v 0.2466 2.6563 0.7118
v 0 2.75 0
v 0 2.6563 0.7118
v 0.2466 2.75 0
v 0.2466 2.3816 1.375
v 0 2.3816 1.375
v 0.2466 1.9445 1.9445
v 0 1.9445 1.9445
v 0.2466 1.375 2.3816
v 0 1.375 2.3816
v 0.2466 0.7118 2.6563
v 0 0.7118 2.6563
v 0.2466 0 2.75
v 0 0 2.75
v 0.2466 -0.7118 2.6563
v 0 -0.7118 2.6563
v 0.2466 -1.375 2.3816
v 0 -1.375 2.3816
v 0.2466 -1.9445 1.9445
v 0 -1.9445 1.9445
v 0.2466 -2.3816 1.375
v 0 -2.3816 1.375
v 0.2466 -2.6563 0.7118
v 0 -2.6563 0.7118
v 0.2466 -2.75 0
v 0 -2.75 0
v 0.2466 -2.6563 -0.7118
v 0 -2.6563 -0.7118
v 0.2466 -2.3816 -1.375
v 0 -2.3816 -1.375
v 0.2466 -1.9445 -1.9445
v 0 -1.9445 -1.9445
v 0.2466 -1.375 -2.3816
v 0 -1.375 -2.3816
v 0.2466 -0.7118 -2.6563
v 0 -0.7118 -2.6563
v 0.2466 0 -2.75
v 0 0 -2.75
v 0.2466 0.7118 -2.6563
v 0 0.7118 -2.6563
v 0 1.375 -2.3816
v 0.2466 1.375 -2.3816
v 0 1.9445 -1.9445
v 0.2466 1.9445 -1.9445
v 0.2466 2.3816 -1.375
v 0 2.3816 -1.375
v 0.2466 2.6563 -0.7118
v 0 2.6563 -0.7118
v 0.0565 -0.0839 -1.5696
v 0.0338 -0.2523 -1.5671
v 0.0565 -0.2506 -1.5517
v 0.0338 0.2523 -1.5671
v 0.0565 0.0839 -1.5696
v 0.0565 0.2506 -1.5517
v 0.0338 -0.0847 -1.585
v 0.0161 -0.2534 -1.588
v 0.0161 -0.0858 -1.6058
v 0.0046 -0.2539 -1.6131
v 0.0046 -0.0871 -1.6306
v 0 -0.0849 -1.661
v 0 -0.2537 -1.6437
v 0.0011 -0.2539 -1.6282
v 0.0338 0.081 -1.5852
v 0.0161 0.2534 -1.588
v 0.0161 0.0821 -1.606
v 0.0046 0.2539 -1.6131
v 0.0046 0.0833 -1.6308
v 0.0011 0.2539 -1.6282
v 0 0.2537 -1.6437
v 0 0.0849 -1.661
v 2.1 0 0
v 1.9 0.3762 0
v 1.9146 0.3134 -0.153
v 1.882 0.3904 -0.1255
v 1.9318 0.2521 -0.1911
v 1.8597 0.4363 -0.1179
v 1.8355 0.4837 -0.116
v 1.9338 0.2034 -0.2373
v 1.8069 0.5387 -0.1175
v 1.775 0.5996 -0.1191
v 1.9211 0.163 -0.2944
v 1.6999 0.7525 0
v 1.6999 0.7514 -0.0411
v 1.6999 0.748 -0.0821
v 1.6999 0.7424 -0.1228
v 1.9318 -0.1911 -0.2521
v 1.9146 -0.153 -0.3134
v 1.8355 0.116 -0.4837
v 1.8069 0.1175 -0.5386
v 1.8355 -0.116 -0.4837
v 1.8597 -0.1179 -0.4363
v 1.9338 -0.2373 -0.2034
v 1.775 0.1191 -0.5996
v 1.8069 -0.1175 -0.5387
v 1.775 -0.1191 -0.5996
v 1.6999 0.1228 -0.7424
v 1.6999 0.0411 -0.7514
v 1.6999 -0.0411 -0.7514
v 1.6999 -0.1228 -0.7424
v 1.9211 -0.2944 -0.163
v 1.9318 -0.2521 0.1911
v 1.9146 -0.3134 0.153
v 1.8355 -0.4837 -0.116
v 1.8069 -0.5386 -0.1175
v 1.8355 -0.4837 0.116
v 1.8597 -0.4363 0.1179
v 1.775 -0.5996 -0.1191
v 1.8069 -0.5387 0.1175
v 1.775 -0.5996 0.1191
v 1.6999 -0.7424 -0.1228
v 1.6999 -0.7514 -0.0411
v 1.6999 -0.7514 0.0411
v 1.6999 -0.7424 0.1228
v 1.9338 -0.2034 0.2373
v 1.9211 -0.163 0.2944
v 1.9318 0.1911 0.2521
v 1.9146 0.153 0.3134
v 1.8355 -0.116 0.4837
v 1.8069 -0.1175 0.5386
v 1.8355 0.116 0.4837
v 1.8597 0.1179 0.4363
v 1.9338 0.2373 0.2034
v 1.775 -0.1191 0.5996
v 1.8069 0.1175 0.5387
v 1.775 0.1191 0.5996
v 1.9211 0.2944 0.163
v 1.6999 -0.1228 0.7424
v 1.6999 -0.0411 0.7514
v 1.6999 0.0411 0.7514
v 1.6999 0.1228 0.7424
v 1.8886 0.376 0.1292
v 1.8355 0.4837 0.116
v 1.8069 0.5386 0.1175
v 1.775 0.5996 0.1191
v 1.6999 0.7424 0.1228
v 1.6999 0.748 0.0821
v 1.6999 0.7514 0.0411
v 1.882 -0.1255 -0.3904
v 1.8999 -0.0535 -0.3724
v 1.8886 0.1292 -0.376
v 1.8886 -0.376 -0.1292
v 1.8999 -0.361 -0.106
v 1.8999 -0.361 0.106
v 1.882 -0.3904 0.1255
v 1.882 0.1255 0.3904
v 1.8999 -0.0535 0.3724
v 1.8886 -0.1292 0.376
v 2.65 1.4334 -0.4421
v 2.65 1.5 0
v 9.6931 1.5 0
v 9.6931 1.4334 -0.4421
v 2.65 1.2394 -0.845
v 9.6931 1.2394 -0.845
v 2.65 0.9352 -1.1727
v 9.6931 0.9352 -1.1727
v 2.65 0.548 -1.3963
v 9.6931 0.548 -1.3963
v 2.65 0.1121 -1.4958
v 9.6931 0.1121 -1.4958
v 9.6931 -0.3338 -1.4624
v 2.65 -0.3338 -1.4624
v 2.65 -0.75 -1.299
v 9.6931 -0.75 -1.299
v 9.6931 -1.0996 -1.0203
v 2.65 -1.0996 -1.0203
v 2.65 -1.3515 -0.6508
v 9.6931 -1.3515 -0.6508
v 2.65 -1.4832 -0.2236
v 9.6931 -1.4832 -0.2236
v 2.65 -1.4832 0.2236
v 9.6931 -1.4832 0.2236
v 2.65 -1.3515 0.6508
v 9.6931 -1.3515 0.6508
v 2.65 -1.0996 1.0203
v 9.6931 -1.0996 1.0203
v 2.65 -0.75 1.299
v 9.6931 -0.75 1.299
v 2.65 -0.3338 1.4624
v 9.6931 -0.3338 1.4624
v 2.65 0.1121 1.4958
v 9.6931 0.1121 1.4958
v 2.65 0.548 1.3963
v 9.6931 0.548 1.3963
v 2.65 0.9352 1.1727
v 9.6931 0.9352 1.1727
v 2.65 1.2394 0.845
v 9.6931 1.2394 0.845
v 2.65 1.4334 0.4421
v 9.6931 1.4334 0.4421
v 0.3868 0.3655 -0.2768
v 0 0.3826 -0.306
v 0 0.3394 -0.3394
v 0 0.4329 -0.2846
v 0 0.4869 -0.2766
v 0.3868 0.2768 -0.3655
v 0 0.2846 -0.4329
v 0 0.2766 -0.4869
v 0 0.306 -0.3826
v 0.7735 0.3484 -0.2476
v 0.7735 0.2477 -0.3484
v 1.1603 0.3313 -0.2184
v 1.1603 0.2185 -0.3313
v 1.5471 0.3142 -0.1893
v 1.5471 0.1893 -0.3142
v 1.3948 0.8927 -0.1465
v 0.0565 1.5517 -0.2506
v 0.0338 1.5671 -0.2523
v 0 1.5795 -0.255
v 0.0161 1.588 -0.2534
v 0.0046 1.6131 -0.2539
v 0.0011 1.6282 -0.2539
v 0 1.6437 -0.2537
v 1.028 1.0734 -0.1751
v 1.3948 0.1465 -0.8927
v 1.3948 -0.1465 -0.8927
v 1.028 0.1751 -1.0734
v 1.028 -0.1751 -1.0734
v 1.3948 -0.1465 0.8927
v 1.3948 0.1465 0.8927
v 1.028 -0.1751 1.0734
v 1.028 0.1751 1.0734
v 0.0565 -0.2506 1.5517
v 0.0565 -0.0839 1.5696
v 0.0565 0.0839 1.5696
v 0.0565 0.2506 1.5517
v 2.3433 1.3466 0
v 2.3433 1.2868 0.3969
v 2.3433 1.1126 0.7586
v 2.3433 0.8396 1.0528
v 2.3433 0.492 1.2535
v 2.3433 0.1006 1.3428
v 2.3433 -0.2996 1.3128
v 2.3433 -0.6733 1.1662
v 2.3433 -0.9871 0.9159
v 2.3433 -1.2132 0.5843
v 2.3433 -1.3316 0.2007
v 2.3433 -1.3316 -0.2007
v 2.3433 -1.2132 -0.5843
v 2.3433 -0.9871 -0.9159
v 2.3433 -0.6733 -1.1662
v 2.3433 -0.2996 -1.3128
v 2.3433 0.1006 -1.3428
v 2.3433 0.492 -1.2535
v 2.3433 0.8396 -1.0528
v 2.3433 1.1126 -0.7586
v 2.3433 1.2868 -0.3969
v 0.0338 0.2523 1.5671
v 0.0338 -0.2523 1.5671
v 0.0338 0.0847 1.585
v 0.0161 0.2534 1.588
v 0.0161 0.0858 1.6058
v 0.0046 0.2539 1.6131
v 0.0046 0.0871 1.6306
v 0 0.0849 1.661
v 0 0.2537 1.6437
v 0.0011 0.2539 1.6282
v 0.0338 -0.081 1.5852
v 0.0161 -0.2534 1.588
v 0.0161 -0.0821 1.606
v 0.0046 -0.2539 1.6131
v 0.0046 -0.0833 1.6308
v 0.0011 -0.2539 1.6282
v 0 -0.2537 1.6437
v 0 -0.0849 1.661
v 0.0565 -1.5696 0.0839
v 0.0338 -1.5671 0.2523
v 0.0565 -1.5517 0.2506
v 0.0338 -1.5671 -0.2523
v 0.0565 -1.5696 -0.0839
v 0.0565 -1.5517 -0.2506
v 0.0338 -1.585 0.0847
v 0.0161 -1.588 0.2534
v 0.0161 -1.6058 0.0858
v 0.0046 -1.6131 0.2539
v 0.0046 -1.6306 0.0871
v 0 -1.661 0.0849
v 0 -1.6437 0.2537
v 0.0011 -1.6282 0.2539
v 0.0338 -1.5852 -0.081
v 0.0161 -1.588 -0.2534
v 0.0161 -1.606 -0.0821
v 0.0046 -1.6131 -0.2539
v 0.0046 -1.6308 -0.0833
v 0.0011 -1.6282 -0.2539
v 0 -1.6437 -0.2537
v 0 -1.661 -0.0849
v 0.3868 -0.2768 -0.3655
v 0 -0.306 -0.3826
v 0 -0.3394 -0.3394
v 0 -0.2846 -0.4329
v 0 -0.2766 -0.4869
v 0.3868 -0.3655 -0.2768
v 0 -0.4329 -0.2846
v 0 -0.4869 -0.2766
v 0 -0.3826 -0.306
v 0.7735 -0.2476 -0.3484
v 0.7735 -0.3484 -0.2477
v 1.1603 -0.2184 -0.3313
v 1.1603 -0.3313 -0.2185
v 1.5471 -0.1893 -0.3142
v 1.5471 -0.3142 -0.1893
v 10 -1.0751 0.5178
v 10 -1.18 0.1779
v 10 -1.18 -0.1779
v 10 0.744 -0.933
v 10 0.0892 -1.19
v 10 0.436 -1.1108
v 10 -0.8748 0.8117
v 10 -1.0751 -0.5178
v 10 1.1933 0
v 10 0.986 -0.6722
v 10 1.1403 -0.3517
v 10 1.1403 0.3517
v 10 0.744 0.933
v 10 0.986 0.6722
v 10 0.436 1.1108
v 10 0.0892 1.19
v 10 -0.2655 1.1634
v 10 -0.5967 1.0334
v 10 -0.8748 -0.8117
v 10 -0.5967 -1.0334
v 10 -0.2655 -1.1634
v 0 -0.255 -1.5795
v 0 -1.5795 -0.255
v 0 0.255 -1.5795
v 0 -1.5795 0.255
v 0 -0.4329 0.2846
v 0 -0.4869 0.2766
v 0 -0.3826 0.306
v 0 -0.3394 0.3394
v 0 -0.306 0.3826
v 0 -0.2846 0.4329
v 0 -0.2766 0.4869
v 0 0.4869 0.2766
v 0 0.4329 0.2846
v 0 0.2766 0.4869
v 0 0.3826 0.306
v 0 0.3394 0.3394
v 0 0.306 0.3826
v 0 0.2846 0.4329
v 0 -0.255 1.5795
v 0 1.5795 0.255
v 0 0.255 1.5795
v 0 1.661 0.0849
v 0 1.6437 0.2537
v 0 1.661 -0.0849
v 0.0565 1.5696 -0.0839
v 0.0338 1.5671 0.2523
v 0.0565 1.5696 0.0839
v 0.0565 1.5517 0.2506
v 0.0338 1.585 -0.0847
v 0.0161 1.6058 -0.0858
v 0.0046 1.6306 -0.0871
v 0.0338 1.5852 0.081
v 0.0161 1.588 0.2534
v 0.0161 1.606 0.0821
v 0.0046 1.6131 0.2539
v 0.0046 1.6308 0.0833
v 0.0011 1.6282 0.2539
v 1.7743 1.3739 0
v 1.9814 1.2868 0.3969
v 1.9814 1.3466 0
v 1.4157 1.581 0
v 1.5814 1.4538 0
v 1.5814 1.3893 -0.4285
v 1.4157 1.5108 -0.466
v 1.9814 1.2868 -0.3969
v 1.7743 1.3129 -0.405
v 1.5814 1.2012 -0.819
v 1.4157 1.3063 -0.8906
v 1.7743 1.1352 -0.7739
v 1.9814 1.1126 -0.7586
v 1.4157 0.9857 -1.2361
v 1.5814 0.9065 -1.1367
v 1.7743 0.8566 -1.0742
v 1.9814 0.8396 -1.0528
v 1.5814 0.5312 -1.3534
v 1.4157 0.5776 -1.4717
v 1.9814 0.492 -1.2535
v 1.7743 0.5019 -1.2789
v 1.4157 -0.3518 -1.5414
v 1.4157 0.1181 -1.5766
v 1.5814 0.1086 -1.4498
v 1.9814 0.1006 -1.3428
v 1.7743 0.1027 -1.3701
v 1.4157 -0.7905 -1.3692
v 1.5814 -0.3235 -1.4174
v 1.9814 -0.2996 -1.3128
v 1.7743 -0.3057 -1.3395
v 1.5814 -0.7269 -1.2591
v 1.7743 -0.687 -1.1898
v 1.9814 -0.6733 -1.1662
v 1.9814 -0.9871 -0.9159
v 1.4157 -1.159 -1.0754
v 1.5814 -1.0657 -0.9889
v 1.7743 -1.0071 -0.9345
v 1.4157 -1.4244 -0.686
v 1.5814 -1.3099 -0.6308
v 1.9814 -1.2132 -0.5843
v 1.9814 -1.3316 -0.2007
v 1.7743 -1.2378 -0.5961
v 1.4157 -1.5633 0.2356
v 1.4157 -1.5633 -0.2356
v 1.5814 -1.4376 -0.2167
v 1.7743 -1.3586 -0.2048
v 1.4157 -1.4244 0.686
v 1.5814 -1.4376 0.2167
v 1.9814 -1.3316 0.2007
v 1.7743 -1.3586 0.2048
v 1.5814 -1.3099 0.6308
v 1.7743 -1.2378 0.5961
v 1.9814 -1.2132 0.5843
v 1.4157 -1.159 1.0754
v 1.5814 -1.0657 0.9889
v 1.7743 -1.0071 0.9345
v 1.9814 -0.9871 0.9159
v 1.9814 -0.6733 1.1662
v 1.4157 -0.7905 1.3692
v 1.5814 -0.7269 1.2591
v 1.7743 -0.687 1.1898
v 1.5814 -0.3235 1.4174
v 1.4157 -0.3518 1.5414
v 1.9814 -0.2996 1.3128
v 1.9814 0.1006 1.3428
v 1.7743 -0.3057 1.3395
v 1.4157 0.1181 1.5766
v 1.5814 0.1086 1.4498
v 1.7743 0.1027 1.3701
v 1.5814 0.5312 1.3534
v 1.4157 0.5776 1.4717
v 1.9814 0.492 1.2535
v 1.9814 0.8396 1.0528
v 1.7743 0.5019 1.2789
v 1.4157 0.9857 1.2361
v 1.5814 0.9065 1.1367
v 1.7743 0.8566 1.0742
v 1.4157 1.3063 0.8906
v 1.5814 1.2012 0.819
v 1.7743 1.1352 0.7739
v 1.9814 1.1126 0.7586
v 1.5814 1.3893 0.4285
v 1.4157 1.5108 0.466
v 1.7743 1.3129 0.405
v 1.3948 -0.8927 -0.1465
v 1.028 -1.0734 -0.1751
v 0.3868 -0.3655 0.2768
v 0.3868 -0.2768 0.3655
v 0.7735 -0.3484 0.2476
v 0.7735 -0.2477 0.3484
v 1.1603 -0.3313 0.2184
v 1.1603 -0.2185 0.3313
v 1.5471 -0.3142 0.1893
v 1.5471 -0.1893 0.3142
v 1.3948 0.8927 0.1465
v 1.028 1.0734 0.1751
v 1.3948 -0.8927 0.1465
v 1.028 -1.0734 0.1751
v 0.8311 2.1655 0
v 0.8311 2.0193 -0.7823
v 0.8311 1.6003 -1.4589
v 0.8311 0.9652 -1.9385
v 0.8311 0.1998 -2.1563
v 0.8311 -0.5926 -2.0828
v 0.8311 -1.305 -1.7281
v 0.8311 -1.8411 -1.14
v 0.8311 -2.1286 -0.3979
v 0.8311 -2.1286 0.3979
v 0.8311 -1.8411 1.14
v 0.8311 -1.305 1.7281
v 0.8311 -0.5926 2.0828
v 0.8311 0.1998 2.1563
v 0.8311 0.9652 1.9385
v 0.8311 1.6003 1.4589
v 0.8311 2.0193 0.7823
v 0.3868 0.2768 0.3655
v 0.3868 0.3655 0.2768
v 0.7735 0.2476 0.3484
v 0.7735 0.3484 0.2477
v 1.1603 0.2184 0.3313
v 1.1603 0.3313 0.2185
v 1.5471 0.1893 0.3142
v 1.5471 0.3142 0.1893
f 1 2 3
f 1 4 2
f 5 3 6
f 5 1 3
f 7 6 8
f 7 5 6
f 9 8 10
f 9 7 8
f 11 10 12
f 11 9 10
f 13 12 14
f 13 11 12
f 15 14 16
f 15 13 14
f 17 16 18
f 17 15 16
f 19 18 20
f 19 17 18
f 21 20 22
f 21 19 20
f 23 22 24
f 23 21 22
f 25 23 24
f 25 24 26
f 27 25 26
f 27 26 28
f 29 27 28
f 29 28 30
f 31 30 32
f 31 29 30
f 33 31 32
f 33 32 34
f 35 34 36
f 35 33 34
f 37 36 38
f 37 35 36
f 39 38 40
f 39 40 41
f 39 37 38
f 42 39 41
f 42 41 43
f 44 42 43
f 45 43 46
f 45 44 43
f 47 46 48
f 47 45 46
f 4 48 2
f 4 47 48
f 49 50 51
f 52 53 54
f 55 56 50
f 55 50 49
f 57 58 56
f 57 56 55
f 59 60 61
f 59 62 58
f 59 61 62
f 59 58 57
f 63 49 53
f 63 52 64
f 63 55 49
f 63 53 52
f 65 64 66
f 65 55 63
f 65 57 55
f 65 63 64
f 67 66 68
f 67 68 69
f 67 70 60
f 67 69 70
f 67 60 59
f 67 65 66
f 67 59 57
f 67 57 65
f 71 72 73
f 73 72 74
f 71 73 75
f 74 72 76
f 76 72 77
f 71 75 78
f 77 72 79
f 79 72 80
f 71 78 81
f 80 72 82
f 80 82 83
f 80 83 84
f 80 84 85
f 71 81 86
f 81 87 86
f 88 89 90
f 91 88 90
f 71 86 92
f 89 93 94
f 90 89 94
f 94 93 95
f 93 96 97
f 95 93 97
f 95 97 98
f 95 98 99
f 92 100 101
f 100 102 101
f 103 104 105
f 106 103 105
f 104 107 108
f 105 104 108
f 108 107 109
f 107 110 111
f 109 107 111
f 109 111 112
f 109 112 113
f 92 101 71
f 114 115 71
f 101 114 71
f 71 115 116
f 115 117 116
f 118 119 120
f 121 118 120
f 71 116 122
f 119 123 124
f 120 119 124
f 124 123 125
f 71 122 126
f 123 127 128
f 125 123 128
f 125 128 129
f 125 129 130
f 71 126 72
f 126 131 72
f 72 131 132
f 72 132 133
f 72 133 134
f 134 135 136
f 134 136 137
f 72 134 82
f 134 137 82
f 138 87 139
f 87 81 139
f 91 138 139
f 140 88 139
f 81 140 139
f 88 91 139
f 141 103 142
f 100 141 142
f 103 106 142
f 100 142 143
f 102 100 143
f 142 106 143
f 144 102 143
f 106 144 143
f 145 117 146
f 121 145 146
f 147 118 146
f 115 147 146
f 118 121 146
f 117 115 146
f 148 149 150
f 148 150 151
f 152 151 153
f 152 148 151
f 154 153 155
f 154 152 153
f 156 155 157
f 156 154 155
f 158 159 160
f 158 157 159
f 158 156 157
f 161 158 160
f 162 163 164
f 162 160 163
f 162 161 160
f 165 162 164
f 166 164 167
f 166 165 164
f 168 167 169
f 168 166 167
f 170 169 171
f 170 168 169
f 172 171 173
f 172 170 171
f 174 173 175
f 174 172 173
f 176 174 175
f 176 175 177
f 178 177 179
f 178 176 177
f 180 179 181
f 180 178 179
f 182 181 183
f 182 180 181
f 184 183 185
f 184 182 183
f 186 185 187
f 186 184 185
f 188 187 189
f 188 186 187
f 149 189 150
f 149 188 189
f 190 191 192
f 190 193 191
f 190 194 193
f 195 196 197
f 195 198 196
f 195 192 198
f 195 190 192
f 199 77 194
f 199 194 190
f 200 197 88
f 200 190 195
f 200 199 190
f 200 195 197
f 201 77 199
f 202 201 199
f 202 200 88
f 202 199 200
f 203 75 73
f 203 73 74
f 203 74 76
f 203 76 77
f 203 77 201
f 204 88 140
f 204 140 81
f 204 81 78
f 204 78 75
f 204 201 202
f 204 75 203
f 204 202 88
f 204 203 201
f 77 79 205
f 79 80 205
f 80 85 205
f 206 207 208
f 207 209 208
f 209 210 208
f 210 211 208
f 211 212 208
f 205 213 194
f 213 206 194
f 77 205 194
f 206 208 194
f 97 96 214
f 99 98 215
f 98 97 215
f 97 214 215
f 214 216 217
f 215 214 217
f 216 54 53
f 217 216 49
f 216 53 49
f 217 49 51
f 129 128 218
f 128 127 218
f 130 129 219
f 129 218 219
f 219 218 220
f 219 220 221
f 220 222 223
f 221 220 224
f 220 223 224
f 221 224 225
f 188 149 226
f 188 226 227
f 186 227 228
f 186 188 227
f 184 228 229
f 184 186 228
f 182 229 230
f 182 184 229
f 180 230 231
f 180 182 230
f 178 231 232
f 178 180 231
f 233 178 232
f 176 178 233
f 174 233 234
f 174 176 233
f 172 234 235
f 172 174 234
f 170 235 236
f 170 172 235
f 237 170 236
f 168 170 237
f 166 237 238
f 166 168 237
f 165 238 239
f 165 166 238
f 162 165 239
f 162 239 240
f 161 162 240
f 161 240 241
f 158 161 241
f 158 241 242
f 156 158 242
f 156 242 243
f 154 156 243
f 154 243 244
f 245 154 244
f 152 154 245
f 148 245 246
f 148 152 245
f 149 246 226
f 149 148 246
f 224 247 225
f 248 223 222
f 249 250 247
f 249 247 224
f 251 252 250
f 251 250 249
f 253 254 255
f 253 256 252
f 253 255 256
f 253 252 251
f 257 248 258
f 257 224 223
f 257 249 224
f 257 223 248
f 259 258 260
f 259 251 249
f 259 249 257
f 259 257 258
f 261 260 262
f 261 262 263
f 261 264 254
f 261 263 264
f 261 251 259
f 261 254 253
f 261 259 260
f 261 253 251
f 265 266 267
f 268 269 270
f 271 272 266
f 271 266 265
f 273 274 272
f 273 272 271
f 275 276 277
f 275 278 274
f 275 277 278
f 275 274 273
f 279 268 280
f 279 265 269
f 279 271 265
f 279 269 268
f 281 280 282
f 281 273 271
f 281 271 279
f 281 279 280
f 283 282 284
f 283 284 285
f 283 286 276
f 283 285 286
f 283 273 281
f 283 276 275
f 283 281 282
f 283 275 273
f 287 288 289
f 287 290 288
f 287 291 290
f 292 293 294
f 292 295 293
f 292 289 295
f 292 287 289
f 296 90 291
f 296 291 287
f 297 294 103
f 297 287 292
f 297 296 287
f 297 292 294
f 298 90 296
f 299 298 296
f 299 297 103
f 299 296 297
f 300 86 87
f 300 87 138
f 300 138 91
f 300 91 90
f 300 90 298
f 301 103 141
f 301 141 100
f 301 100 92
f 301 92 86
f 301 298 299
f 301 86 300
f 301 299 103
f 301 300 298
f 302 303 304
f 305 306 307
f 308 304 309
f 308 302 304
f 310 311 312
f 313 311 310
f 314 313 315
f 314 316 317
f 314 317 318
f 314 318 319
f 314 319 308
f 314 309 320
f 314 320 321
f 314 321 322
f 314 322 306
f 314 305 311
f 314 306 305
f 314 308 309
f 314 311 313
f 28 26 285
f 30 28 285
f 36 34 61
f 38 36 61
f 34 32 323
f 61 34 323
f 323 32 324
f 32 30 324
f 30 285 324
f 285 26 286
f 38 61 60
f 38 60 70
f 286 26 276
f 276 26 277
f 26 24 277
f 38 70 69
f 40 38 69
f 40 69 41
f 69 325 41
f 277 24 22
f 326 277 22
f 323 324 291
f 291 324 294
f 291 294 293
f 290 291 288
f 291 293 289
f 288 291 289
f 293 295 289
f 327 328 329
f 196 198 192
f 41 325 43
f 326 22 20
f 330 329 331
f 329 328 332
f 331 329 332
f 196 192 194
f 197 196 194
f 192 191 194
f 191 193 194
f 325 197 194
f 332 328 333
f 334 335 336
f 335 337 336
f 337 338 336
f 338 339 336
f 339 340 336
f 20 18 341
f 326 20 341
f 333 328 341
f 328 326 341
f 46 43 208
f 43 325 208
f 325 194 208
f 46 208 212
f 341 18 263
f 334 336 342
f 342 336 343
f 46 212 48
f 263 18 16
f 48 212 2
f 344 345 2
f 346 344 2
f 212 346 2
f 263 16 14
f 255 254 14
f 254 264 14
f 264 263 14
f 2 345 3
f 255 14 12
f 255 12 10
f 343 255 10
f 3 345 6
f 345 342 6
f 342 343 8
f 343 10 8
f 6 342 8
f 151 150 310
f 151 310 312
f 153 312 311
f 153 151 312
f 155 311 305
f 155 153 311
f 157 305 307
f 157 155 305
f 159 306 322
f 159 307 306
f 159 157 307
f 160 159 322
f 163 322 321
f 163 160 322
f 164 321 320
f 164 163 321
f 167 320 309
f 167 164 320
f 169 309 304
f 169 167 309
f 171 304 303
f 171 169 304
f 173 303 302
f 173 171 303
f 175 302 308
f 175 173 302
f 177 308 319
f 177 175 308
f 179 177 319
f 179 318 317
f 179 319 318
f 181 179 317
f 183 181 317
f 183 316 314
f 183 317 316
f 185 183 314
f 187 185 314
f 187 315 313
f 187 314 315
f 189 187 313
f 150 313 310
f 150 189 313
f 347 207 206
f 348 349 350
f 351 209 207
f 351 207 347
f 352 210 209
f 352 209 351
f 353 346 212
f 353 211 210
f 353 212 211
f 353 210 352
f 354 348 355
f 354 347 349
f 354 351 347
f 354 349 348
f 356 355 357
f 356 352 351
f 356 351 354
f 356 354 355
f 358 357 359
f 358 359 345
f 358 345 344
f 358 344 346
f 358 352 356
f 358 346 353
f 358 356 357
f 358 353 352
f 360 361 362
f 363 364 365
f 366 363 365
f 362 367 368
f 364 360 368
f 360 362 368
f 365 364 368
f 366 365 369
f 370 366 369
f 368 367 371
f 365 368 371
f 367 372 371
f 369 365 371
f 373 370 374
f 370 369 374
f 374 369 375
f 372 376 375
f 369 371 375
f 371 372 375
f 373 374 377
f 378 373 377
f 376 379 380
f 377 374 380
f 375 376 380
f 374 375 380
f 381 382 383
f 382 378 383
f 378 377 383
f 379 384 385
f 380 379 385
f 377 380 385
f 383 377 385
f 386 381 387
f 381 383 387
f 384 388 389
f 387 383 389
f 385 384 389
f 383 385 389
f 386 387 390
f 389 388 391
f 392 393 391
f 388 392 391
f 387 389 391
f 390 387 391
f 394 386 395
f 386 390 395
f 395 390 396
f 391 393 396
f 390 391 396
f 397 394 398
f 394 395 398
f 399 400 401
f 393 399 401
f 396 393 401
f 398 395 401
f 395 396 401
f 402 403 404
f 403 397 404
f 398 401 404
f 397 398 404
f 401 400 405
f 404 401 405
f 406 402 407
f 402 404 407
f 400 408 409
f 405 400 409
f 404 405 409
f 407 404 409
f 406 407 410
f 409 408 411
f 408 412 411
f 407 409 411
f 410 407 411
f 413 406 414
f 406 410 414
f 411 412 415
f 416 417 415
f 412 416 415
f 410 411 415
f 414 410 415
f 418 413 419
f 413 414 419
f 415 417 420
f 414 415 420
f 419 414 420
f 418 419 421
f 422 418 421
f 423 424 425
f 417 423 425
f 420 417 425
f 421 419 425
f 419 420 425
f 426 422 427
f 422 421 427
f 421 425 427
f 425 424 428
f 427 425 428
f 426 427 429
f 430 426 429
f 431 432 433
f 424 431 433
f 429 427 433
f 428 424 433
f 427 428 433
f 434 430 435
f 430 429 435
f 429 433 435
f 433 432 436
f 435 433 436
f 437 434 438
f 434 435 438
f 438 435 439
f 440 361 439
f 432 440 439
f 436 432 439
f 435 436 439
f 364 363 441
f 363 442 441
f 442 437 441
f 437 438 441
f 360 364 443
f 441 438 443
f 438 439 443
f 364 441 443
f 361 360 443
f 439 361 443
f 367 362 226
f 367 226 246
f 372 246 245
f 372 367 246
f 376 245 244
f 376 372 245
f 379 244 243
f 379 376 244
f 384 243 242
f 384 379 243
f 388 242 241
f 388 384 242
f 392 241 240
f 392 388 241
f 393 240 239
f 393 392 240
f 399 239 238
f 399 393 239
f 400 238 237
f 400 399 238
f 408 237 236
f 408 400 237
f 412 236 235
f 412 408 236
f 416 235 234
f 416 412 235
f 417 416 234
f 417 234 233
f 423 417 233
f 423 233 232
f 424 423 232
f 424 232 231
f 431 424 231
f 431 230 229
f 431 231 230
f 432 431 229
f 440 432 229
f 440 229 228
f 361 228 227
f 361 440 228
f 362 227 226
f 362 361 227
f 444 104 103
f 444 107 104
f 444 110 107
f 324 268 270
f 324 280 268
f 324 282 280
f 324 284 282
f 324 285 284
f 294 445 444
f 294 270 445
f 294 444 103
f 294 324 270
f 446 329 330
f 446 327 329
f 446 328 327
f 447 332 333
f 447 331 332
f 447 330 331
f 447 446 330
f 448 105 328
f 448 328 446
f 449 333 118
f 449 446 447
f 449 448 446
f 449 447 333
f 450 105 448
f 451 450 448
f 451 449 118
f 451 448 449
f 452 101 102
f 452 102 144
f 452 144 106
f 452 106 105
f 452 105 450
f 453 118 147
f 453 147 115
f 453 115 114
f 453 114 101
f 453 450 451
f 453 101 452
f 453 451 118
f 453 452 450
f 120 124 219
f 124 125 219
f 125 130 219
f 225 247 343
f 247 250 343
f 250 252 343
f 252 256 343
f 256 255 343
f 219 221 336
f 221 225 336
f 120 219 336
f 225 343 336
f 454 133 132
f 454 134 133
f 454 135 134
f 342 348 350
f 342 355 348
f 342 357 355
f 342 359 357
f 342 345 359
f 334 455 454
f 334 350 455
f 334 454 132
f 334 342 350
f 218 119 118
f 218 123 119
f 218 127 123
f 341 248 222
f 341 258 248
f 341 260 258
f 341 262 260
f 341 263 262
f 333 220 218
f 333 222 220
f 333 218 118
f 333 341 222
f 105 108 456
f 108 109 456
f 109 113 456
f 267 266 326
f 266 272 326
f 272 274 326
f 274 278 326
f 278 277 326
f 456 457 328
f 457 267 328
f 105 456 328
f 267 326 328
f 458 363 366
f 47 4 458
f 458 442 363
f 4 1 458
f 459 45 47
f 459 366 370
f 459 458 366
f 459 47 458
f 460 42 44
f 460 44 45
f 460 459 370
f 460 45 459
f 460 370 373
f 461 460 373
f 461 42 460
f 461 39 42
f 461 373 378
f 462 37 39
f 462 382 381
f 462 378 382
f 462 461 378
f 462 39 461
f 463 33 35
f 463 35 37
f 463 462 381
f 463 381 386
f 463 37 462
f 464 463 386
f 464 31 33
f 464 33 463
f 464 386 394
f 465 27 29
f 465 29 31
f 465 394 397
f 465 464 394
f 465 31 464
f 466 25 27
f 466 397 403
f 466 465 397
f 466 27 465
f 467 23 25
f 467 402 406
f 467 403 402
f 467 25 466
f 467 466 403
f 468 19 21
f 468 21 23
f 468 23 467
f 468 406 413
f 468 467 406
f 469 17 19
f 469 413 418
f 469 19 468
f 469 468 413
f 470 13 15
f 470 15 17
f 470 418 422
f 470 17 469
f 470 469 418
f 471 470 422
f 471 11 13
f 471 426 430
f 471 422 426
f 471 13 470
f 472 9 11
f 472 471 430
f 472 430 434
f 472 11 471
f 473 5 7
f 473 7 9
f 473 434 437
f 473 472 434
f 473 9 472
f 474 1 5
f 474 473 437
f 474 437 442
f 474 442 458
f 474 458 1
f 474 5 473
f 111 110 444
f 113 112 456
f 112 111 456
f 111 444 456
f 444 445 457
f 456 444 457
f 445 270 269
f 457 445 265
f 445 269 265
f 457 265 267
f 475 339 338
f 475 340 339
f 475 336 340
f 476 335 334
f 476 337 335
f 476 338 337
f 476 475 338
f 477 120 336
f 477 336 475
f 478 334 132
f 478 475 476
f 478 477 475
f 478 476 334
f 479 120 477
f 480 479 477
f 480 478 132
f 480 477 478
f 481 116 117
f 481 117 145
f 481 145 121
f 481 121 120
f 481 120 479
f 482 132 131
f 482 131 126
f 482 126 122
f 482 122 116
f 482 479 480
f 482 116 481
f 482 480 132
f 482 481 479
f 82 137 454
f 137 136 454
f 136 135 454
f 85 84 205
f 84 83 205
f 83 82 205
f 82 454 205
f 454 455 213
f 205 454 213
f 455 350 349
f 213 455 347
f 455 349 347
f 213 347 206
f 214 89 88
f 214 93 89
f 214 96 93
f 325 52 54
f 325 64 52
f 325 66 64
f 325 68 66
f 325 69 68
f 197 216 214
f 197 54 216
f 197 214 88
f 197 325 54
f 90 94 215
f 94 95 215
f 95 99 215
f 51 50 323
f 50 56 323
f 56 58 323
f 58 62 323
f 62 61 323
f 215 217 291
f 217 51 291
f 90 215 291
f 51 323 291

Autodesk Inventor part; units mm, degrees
ref_plane "YZ Plane" through (0, 0, 0) normal (1, 0, 0) x (0, 1, 0)
ref_plane "XZ Plane" through (0, 0, 0) normal (0, 1, 0) x (-1, 0, 0)
sketch "Sketch1" plane through (0, 0, 0) normal (0, 0, 1) x (1, 0, 0)
  line L0 (2.1, 0) -> (10, 0)
  line L1 (10, 0) -> (10, 1.5)
  line L2 (10, 1.5) -> (2.65, 1.5)
  line L3 (2.65, 1.5) -> (2.3433, 1.3466)
  line L4 (2.3433, 1.3466) -> (1.9814, 1.3466)
  line L5 (0, 2.75) -> (0, 1.6)
  line L6 (0, 1.6) -> (1.6999, 0.7525)
  line L7 (1.6999, 0.7525) -> (2.1, 0)
  line L8 (-2, 0) -> (12, 0) projected
  line L9 (0, -0.55) -> (0, 3.3) projected
  line L10 (0, 2.75) -> (0.2466, 2.75)
  line L11 (0.2466, 2.75) -> (1.4157, 1.581)
  line L12 (2.65, 1.5) -> (1.4966, 1.5) construction
  arc A0 (1.4157, 1.581) -> (1.9814, 1.3466) centre (1.9814, 2.1466) ccw
  point P0 (1.65, 1.3466)
  dimension "d1" = 7.35
  dimension "d2" = 3
  dimension "d3" = 2.6933
  dimension "d4" = 3.2
  dimension "d5" = 26.5
  dimension "d6" = 62
  dimension "d7" = 2.1
  dimension "d8" = 0.3067
  dimension "d12" = 5.5
  dimension "d13" = 45
  dimension "d15" = 10
  dimension "d24" = 1.65
  dimension "d93" = 0.8
revolve "Body" add sketch "Sketch1" angle 360 about axis through (2.1, 0, 0) along (1, 0, 0) contours L7 L6 L5 L10 L11 A0 L4 L3 L2 L1 L0
sketch "Sketch2" plane through (0, 0, 0) normal (-1, 0, 0) x (0, 0, 1)
  line L0 (0, 1.6) -> (0, 0) construction
  line L1 (0, 0) -> (1.6, 0) construction
  arc A0 (0.48, 0) -> (0, 0.48) centre (0, 0) ccw construction
  arc A1 (0.56, 0) -> (0, 0.56) centre (0, 0) ccw construction
  arc A2 (1.5795, 0.255) -> (0.255, 1.5795) centre (0, 0) ccw
  line L2 (0, 0) -> (1.1314, 1.1314) construction
  line L3 (0.255, 1.5795) -> (0.2766, 0.4869)
  line L4 (1.5795, 0.255) -> (0.4869, 0.2766)
  arc A3 (0.255, 1.5795) -> (0, 1.6) centre (0, 0) ccw
  arc A4 (1.6, 0) -> (1.5795, 0.255) centre (0, 0) ccw
  line L5 (0, -3.85) -> (0, 3.85) projected
  line L6 (-3.85, 0) -> (3.85, 0) projected
  arc A5 (0.255, -1.5795) -> (1.5795, -0.255) centre (0, 0) ccw
  line L7 (0.255, -1.5795) -> (0.2766, -0.4869)
  line L8 (1.5795, -0.255) -> (0.4869, -0.2766)
  arc A6 (0, -1.6) -> (0.255, -1.5795) centre (0, 0) ccw
  arc A7 (1.5795, -0.255) -> (1.6, 0) centre (0, 0) ccw
  arc A8 (-0.255, 1.5795) -> (-1.5795, 0.255) centre (0, 0) ccw
  line L9 (-0.255, 1.5795) -> (-0.2766, 0.4869)
  line L10 (-1.5795, 0.255) -> (-0.4869, 0.2766)
  arc A9 (0, 1.6) -> (-0.255, 1.5795) centre (0, 0) ccw
  arc A10 (-1.5795, 0.255) -> (-1.6, 0) centre (0, 0) ccw
  arc A11 (-0.255, -1.5795) -> (0, -1.6) centre (0, 0) ccw
  arc A12 (-1.5795, -0.255) -> (-0.255, -1.5795) centre (0, 0) ccw
  arc A13 (-1.6, 0) -> (-1.5795, -0.255) centre (0, 0) ccw
  line L11 (-1.5795, -0.255) -> (-0.4869, -0.2766)
  line L12 (-0.255, -1.5795) -> (-0.2766, -0.4869)
  arc A14 (0.2766, 0.4869) -> (0.4869, 0.2766) centre (0.4912, 0.4912) ccw
  arc A15 (0.4869, -0.2766) -> (0.2766, -0.4869) centre (0.4912, -0.4912) ccw
  arc A16 (-0.4869, 0.2766) -> (-0.2766, 0.4869) centre (-0.4912, 0.4912) ccw
  arc A17 (-0.2766, -0.4869) -> (-0.4869, -0.2766) centre (-0.4912, -0.4912) ccw
  point P0 (1.1314, -1.1314)
  point P1 (-1.1314, 1.1314)
  point P2 (-1.1314, -1.1314)
  dimension "d17" = 0.96
  dimension "d18" = 1.12
  dimension "d19" = 3.2
  dimension "d20" = 45
  dimension "d21" = 0.255
extrude "Slot" add sketch "Sketch2" against normal up to next draft 5 contours L4 A14 L3 A2 | A5 L7 A15 L8 | L9 A16 L10 A8 | A12 L11 A17 L12
fillet "Fillet1" radius 0.102 4 edges at (0, 1.6, 0) (0, 0, -1.6) (0, -1.6, 0) (0, 0, 1.6)
thread "Thread" size "M3x0.5" class "6g" standard "ISO Metric profile" length 7.35
chamfer "Chamfer1" distance 0.3067 distance2 0.3069 1 edges at (10, -1.5, 0) measured on face at (10, -0.5112, 0.3316)
ref_plane "Work Plane2" through (3.35, 0, 0) normal (0, 0, -1) x (1, 0, 0)
equation "\"d24\" = KOH"
equation "\"d17\" = 0.3 * SDM"
equation "\"d18\" = 0.35 * SDM"
equation "\"d19\" = SDM"
equation "\"d21\" = 0.5 * SBR"
equation "\"d1\" = GEL"
equation "\"d2\" = GD"
equation "\"d3\" = BDM"
equation "\"d4\" = SDM"
equation "\"d7\" = INTI"
equation "\"d8\" = GAL"
equation "\"d12\" = KOD"
equation "\"d13\" = 0.5 * SEWI"
equation "\"d15\" = NLG"
equation "\"d93\" = R"
equation "\"d23\" = 0.2 * SBR"
equation "\"d10\" = GEL"
equation "\"d25\" = -0.5 * SPD + 0.5 * GD"
equation "\"NLG\" = 10"
equation "\"GEL\" = 7.35"
equation "\"GAL\" = 0.61345 * PTC"
equation "\"SPD\" = NND - 1.2269 * PTC"
equation "\"KOD\" = 5.5"
equation "\"KOH\" = 1.65"
equation "\"SBR\" = 0.51"
equation "\"INTI\" = 2.1"
equation "\"SDM\" = 3.2"
equation "\"GD\" = NND"
equation "\"BDM\" = NND - GAL"
equation "\"SEWI\" = 90deg"
equation "\"d9\" = SDM"
equation "\"R\" = 0.8"
equation "\"GUL\" = 0.61345 * PTC"
equation "\"TOA\" = 30deg"
equation "\"EPV\" = 3.15"
equation "\"THREADDIA\" = 3"
equation "\"PTC\" = 0.5"
equation "\"NND\" = 3"
equation "\"GD1\" = THREADDIA - 1.2269 * PTC"
properties part number "ISO 7046-1  - M3 x 10 - 4.8 - H" material "Steel"
